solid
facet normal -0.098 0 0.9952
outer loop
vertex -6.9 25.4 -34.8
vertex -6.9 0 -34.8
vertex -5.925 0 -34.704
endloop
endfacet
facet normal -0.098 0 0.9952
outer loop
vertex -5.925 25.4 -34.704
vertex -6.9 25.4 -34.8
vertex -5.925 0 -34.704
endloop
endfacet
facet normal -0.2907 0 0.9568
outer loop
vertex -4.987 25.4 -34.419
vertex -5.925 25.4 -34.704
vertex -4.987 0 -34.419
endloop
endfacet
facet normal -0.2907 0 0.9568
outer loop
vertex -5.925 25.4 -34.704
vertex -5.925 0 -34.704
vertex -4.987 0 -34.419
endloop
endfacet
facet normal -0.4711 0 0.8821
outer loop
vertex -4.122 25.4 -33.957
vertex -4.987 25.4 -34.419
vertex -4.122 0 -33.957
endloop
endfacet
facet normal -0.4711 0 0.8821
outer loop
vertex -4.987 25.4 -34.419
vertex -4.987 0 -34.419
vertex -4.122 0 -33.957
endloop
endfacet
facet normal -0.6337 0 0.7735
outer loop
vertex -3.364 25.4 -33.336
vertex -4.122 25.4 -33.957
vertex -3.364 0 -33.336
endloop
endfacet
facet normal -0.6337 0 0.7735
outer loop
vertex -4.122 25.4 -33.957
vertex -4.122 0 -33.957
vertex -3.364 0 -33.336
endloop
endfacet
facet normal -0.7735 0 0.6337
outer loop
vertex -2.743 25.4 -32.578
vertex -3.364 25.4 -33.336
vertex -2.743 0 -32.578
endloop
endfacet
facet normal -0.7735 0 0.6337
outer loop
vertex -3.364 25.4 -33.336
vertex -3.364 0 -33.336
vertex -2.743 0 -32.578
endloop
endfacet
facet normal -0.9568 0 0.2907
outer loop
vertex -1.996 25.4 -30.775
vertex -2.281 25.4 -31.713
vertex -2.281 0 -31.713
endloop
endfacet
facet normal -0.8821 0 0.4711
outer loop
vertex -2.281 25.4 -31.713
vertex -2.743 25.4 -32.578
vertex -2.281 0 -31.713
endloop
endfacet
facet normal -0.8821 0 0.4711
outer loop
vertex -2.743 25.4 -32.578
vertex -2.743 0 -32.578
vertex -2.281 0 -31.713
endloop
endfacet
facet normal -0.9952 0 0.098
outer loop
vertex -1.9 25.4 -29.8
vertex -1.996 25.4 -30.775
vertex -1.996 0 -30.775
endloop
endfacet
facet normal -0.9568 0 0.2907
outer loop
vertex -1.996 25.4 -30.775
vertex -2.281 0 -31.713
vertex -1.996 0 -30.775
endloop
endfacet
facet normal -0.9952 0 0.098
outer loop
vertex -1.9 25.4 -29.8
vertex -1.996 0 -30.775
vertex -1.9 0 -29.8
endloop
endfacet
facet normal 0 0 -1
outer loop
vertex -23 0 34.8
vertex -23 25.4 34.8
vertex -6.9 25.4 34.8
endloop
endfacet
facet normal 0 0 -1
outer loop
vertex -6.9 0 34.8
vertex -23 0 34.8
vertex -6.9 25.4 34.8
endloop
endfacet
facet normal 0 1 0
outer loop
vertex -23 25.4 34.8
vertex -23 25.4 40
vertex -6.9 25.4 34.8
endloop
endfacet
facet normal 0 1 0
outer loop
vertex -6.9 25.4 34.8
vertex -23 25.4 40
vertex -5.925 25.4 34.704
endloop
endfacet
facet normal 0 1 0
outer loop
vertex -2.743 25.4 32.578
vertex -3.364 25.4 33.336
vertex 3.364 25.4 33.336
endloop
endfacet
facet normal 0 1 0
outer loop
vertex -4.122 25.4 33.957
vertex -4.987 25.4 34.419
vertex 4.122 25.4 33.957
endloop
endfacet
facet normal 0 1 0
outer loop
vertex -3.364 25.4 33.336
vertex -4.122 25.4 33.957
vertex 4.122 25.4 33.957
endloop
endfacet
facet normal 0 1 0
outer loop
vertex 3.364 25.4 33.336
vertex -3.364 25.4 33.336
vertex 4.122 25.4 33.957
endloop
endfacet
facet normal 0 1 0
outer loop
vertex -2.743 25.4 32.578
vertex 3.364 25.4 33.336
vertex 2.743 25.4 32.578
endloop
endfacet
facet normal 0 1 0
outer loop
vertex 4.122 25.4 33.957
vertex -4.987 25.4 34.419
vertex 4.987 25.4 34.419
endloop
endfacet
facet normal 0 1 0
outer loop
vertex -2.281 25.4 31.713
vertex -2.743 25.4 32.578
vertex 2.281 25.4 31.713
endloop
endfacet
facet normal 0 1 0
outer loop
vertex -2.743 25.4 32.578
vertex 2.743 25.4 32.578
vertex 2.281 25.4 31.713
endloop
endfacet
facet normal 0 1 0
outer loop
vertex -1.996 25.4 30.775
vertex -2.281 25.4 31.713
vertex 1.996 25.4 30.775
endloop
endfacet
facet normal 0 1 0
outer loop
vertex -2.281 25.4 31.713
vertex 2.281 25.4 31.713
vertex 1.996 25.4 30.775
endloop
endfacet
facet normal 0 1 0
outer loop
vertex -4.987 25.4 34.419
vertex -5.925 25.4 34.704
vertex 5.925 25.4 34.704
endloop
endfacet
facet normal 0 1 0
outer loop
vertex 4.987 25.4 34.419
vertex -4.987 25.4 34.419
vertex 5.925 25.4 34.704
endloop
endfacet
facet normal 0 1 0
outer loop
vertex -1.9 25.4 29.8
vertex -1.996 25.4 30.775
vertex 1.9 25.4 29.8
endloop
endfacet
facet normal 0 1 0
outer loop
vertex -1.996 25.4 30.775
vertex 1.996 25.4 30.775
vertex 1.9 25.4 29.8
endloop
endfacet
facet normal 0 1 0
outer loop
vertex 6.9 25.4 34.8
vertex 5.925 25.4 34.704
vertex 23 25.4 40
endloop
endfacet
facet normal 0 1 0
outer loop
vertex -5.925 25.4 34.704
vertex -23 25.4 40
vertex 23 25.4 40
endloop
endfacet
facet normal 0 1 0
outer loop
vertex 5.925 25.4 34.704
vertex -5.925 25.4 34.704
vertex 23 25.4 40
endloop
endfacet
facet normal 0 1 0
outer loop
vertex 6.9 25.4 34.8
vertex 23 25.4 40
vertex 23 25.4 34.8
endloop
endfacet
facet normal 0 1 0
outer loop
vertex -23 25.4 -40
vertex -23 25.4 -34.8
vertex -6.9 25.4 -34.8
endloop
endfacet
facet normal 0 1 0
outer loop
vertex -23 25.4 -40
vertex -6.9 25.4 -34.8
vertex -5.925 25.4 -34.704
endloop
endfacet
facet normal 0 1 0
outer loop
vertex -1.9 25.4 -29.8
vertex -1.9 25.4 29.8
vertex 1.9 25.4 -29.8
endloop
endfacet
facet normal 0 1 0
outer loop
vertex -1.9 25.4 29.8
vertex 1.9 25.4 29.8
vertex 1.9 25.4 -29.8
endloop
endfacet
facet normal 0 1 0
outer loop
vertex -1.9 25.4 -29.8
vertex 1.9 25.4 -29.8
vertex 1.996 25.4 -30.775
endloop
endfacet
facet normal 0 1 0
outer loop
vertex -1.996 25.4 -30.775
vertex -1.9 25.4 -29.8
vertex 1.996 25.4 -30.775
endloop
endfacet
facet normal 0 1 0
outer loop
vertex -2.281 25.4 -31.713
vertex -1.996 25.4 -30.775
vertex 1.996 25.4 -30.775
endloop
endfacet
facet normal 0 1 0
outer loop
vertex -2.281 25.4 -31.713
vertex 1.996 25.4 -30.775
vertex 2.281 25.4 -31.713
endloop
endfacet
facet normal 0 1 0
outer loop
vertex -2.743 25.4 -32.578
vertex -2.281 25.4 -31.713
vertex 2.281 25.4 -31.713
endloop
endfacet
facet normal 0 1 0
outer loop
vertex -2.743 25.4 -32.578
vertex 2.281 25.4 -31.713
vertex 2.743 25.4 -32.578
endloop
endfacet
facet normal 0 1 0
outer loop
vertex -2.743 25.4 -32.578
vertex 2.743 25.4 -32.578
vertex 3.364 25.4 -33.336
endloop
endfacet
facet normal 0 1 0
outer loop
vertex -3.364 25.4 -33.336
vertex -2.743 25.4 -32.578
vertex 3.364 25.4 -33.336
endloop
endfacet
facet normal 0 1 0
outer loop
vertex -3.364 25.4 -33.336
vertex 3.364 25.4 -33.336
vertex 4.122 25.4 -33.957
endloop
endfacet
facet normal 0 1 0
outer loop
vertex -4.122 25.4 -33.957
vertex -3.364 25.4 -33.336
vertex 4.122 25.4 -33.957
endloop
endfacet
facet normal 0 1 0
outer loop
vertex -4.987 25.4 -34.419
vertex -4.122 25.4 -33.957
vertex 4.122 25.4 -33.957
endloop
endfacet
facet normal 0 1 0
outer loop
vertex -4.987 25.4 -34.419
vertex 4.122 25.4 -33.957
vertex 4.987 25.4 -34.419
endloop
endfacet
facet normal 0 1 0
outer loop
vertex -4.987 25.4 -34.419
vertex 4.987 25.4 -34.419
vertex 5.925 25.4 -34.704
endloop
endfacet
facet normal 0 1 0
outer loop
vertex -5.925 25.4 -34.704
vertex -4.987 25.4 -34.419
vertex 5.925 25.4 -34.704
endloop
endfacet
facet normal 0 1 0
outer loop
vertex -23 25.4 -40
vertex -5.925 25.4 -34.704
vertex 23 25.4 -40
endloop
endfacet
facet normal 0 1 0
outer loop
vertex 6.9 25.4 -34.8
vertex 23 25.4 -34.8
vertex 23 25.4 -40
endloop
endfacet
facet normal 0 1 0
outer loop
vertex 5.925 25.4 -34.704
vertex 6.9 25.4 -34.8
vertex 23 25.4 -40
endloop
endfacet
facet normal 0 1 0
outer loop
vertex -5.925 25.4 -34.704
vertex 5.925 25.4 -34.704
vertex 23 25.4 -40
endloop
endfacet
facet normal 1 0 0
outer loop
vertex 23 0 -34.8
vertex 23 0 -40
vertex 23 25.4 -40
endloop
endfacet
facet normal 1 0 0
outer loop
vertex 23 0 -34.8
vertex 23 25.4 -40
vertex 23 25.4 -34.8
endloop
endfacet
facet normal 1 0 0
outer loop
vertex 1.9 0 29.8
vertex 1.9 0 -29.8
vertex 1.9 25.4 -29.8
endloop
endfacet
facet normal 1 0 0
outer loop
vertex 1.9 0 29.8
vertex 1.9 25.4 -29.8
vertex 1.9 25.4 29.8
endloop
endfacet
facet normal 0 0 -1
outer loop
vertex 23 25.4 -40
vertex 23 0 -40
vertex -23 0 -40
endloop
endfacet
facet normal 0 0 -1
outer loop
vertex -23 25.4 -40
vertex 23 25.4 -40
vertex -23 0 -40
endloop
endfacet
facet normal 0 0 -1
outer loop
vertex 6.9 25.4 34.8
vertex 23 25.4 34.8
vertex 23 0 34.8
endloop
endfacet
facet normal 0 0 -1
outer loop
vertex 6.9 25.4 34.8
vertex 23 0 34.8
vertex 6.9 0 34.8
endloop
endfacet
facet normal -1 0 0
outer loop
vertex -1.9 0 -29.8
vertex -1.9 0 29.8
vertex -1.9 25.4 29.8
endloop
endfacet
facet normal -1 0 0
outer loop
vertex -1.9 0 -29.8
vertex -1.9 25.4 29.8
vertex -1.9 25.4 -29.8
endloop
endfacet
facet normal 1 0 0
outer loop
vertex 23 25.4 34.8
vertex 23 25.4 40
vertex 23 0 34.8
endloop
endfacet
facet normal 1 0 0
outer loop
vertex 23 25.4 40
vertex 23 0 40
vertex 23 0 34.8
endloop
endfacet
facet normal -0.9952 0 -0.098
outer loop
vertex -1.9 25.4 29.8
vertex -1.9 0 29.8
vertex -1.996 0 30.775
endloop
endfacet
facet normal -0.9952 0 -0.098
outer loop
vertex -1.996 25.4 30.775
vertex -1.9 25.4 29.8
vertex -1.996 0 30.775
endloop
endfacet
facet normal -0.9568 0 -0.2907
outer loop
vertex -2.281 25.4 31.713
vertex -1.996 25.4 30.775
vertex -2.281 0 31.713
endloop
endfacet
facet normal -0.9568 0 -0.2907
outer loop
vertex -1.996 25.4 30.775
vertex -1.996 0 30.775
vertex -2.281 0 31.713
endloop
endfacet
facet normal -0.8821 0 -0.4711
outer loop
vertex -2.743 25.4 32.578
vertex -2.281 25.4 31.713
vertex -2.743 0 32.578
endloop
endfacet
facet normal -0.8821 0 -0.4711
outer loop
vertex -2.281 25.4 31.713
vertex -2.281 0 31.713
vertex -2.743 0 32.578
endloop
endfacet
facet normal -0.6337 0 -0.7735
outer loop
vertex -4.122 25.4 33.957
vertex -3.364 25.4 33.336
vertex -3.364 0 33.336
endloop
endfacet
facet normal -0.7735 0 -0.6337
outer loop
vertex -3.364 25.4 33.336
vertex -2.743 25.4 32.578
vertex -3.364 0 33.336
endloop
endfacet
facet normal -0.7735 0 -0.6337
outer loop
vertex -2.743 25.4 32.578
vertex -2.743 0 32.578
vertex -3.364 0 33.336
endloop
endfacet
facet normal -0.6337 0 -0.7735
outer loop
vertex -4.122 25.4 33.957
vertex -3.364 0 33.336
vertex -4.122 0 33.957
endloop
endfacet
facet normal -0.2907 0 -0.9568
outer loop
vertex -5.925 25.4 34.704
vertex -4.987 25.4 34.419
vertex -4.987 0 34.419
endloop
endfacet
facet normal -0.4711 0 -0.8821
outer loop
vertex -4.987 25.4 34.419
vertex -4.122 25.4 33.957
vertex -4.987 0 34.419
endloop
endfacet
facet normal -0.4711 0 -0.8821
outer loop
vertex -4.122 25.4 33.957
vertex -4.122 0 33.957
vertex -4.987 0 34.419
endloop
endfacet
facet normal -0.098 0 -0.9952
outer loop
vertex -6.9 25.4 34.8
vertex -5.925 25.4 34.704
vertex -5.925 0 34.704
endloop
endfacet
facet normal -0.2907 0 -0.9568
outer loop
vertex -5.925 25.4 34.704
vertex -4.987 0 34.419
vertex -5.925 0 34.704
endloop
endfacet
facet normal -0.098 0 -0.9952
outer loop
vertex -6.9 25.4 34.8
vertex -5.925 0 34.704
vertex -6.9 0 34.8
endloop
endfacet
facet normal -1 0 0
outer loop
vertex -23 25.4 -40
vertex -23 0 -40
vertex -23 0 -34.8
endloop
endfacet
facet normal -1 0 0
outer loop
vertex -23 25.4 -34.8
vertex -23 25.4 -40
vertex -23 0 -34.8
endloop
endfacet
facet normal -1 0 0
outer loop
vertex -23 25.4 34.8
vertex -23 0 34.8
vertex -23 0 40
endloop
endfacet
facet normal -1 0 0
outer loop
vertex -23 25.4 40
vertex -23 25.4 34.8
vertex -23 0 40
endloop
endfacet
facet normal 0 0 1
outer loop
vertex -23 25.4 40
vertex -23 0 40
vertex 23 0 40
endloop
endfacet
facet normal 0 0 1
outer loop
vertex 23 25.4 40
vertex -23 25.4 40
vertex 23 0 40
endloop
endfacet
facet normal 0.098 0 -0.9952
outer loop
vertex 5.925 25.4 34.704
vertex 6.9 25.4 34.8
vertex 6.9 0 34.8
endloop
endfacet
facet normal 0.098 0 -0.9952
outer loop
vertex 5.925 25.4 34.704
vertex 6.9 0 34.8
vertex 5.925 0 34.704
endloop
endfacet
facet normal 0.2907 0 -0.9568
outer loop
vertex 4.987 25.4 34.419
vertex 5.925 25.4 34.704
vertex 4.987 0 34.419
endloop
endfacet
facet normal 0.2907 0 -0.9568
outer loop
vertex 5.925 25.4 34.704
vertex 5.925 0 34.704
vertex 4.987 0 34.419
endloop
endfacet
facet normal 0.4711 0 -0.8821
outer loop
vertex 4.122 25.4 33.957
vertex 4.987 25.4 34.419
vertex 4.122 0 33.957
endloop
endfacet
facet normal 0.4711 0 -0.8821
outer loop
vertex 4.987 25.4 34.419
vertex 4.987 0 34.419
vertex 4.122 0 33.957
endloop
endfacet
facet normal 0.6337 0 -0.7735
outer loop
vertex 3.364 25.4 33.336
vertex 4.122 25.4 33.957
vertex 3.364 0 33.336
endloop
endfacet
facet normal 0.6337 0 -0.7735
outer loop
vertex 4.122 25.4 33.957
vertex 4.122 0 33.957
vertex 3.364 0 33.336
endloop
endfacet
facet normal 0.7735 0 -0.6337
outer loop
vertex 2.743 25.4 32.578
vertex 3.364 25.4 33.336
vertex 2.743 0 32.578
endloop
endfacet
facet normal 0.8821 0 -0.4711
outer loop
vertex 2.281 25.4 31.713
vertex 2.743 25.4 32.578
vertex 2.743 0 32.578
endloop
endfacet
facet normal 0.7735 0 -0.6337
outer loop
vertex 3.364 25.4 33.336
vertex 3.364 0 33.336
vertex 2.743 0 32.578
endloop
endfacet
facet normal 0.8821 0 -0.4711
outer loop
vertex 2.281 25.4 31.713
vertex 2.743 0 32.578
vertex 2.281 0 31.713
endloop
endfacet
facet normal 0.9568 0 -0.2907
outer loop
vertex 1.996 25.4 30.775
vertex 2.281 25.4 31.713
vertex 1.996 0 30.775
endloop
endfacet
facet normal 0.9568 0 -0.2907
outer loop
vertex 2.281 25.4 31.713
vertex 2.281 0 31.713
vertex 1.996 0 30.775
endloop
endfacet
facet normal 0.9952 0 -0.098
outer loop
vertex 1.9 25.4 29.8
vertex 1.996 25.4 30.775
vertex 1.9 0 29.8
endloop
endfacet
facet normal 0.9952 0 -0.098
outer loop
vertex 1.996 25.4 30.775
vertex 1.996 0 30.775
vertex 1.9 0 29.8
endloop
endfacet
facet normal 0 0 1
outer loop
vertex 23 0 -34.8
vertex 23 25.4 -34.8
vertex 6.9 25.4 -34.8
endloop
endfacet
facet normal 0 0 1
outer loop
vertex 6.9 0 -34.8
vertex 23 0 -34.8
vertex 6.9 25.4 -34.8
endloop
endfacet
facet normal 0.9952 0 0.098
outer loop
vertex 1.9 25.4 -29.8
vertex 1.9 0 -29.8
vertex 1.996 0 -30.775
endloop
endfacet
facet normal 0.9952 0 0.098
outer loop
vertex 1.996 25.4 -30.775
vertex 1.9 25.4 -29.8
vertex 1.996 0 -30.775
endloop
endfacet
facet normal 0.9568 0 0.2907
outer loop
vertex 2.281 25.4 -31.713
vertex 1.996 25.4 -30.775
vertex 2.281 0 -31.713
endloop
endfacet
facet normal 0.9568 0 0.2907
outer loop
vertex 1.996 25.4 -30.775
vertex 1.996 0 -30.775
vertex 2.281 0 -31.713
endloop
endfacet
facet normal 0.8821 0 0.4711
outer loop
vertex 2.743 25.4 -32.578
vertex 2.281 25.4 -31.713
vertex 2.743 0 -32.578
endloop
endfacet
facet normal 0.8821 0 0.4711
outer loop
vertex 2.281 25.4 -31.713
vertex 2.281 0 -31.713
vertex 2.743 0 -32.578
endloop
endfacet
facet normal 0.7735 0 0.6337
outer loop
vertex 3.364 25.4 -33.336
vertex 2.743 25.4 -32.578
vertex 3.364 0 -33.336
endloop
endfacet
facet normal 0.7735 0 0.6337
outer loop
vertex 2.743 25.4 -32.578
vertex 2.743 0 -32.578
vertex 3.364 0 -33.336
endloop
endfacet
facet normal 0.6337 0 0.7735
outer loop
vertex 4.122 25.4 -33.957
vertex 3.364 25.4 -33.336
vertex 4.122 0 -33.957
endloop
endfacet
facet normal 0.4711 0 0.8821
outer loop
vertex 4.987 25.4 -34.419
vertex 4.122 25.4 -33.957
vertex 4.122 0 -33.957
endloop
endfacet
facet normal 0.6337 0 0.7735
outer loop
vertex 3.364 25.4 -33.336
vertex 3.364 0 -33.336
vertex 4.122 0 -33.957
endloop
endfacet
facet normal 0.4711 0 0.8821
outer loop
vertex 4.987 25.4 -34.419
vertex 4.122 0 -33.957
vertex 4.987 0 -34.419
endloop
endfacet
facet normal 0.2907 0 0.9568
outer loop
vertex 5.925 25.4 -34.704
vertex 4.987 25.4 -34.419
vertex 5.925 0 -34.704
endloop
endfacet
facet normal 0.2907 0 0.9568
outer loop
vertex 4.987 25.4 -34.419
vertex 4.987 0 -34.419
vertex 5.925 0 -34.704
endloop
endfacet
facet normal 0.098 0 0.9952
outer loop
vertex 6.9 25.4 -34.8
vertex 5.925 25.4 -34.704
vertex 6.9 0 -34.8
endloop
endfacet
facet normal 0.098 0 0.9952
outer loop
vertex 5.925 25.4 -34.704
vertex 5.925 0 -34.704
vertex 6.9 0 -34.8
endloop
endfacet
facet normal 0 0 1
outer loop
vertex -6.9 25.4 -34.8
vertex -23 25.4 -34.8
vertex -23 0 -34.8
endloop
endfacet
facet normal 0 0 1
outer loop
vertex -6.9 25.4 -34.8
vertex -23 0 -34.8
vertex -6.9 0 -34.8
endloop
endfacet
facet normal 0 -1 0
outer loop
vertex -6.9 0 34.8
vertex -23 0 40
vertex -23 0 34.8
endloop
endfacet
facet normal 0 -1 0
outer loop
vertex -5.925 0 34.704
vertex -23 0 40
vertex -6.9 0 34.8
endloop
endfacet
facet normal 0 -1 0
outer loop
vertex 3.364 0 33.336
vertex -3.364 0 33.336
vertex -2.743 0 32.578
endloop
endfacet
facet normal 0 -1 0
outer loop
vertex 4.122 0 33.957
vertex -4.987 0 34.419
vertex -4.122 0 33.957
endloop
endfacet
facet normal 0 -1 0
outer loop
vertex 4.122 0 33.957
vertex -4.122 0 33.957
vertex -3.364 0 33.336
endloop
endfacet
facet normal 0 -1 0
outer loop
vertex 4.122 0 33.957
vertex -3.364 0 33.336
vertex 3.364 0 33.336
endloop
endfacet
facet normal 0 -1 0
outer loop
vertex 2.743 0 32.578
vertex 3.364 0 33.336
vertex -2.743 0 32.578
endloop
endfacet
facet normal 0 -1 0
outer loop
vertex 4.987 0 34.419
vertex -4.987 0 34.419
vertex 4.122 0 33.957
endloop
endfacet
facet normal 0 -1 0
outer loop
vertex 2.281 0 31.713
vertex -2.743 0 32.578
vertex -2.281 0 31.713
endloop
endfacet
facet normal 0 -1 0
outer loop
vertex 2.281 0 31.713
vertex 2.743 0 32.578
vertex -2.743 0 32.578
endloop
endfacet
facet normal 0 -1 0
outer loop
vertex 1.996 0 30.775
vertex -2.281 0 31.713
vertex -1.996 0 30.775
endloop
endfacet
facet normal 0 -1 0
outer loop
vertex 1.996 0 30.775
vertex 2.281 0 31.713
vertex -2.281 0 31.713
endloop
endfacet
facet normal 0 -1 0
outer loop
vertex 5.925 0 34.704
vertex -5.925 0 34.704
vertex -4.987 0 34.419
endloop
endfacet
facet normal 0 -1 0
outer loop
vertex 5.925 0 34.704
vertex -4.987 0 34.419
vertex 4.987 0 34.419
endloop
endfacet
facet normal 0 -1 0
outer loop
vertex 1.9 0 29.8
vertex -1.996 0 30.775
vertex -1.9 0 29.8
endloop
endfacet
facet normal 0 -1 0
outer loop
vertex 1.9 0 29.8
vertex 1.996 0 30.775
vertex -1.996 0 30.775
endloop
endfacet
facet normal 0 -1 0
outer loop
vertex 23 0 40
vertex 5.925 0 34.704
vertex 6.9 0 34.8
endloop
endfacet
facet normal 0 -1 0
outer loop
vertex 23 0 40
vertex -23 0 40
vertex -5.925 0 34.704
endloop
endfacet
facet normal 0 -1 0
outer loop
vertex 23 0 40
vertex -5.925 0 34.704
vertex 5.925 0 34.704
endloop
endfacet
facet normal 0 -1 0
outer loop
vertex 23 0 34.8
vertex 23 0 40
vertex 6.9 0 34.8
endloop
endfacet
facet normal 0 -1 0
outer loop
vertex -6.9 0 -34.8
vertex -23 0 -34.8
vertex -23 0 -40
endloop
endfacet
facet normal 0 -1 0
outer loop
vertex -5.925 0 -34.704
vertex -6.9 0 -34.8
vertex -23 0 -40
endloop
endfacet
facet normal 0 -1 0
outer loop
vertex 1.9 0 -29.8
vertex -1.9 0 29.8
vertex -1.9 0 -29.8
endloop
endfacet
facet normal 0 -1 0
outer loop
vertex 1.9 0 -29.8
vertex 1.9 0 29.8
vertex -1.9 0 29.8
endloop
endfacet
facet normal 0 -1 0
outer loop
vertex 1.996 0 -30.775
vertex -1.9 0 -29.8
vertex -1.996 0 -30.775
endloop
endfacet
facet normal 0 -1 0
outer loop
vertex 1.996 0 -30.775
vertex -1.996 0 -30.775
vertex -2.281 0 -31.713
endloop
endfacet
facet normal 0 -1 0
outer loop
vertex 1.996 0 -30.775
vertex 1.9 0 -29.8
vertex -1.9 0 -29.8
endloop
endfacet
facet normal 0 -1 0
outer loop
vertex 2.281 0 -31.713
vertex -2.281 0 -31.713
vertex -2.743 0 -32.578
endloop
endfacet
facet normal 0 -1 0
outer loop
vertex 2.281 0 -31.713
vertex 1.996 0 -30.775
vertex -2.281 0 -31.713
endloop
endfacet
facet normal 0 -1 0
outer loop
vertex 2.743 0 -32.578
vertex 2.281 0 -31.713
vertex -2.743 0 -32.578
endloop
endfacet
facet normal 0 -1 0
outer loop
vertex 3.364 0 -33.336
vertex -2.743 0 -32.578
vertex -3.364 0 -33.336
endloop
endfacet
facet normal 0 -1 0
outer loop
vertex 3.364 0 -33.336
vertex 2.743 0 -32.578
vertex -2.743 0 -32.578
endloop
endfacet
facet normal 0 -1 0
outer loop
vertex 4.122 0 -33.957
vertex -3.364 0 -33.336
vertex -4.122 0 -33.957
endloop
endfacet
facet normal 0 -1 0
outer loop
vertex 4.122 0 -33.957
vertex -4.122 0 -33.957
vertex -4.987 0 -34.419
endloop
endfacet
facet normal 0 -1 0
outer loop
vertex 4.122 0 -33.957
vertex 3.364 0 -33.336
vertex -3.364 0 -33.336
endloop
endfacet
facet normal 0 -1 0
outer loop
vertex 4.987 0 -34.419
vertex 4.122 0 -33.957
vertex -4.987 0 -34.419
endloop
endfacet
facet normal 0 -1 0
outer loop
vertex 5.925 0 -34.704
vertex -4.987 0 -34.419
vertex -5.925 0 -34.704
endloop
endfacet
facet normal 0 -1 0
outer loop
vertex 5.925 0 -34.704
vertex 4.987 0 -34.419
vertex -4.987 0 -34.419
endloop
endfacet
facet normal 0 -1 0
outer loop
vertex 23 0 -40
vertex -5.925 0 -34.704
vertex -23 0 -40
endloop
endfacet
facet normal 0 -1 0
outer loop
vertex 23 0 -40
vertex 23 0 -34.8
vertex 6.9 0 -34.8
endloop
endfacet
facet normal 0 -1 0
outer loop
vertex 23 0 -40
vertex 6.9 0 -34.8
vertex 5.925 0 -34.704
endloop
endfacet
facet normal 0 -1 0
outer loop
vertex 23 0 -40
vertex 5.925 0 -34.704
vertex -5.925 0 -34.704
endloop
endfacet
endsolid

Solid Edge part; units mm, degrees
sketch "Sketch1" plane through (0, 0, 0) normal (0, -1, 0) x (1, 0, 0)
  line L0 (-1.9, 29.8) -> (-1.9, -29.8)
  arc A0 (-1.9, -29.8) -> (-6.9, -34.8) centre (-6.9, -29.8) cw
  line L1 (-23, -34.8) -> (-6.9, -34.8)
  line L2 (-23, -40) -> (-23, -34.8)
  line L3 (23, -40) -> (-23, -40)
  line L4 (23, -40) -> (23, -34.8)
  line L5 (23, -34.8) -> (6.9, -34.8)
  arc A1 (1.9, -29.8) -> (6.9, -34.8) centre (6.9, -29.8) ccw
  line L6 (1.9, -29.8) -> (1.9, 29.8)
  arc A2 (6.9, 34.8) -> (1.9, 29.8) centre (6.9, 29.8) ccw
  line L7 (23, 34.8) -> (6.9, 34.8)
  line L8 (23, 40) -> (23, 34.8)
  line L9 (-23, 40) -> (23, 40)
  line L10 (-23, 34.8) -> (-23, 40)
  line L11 (-23, 34.8) -> (-6.9, 34.8)
  arc A3 (-6.9, 34.8) -> (-1.9, 29.8) centre (-6.9, 29.8) cw
  dimension "D1" = 23
  dimension "D2" = 23
extrude "Protrusion1" add sketch "Sketch1" against normal blind 25.4
